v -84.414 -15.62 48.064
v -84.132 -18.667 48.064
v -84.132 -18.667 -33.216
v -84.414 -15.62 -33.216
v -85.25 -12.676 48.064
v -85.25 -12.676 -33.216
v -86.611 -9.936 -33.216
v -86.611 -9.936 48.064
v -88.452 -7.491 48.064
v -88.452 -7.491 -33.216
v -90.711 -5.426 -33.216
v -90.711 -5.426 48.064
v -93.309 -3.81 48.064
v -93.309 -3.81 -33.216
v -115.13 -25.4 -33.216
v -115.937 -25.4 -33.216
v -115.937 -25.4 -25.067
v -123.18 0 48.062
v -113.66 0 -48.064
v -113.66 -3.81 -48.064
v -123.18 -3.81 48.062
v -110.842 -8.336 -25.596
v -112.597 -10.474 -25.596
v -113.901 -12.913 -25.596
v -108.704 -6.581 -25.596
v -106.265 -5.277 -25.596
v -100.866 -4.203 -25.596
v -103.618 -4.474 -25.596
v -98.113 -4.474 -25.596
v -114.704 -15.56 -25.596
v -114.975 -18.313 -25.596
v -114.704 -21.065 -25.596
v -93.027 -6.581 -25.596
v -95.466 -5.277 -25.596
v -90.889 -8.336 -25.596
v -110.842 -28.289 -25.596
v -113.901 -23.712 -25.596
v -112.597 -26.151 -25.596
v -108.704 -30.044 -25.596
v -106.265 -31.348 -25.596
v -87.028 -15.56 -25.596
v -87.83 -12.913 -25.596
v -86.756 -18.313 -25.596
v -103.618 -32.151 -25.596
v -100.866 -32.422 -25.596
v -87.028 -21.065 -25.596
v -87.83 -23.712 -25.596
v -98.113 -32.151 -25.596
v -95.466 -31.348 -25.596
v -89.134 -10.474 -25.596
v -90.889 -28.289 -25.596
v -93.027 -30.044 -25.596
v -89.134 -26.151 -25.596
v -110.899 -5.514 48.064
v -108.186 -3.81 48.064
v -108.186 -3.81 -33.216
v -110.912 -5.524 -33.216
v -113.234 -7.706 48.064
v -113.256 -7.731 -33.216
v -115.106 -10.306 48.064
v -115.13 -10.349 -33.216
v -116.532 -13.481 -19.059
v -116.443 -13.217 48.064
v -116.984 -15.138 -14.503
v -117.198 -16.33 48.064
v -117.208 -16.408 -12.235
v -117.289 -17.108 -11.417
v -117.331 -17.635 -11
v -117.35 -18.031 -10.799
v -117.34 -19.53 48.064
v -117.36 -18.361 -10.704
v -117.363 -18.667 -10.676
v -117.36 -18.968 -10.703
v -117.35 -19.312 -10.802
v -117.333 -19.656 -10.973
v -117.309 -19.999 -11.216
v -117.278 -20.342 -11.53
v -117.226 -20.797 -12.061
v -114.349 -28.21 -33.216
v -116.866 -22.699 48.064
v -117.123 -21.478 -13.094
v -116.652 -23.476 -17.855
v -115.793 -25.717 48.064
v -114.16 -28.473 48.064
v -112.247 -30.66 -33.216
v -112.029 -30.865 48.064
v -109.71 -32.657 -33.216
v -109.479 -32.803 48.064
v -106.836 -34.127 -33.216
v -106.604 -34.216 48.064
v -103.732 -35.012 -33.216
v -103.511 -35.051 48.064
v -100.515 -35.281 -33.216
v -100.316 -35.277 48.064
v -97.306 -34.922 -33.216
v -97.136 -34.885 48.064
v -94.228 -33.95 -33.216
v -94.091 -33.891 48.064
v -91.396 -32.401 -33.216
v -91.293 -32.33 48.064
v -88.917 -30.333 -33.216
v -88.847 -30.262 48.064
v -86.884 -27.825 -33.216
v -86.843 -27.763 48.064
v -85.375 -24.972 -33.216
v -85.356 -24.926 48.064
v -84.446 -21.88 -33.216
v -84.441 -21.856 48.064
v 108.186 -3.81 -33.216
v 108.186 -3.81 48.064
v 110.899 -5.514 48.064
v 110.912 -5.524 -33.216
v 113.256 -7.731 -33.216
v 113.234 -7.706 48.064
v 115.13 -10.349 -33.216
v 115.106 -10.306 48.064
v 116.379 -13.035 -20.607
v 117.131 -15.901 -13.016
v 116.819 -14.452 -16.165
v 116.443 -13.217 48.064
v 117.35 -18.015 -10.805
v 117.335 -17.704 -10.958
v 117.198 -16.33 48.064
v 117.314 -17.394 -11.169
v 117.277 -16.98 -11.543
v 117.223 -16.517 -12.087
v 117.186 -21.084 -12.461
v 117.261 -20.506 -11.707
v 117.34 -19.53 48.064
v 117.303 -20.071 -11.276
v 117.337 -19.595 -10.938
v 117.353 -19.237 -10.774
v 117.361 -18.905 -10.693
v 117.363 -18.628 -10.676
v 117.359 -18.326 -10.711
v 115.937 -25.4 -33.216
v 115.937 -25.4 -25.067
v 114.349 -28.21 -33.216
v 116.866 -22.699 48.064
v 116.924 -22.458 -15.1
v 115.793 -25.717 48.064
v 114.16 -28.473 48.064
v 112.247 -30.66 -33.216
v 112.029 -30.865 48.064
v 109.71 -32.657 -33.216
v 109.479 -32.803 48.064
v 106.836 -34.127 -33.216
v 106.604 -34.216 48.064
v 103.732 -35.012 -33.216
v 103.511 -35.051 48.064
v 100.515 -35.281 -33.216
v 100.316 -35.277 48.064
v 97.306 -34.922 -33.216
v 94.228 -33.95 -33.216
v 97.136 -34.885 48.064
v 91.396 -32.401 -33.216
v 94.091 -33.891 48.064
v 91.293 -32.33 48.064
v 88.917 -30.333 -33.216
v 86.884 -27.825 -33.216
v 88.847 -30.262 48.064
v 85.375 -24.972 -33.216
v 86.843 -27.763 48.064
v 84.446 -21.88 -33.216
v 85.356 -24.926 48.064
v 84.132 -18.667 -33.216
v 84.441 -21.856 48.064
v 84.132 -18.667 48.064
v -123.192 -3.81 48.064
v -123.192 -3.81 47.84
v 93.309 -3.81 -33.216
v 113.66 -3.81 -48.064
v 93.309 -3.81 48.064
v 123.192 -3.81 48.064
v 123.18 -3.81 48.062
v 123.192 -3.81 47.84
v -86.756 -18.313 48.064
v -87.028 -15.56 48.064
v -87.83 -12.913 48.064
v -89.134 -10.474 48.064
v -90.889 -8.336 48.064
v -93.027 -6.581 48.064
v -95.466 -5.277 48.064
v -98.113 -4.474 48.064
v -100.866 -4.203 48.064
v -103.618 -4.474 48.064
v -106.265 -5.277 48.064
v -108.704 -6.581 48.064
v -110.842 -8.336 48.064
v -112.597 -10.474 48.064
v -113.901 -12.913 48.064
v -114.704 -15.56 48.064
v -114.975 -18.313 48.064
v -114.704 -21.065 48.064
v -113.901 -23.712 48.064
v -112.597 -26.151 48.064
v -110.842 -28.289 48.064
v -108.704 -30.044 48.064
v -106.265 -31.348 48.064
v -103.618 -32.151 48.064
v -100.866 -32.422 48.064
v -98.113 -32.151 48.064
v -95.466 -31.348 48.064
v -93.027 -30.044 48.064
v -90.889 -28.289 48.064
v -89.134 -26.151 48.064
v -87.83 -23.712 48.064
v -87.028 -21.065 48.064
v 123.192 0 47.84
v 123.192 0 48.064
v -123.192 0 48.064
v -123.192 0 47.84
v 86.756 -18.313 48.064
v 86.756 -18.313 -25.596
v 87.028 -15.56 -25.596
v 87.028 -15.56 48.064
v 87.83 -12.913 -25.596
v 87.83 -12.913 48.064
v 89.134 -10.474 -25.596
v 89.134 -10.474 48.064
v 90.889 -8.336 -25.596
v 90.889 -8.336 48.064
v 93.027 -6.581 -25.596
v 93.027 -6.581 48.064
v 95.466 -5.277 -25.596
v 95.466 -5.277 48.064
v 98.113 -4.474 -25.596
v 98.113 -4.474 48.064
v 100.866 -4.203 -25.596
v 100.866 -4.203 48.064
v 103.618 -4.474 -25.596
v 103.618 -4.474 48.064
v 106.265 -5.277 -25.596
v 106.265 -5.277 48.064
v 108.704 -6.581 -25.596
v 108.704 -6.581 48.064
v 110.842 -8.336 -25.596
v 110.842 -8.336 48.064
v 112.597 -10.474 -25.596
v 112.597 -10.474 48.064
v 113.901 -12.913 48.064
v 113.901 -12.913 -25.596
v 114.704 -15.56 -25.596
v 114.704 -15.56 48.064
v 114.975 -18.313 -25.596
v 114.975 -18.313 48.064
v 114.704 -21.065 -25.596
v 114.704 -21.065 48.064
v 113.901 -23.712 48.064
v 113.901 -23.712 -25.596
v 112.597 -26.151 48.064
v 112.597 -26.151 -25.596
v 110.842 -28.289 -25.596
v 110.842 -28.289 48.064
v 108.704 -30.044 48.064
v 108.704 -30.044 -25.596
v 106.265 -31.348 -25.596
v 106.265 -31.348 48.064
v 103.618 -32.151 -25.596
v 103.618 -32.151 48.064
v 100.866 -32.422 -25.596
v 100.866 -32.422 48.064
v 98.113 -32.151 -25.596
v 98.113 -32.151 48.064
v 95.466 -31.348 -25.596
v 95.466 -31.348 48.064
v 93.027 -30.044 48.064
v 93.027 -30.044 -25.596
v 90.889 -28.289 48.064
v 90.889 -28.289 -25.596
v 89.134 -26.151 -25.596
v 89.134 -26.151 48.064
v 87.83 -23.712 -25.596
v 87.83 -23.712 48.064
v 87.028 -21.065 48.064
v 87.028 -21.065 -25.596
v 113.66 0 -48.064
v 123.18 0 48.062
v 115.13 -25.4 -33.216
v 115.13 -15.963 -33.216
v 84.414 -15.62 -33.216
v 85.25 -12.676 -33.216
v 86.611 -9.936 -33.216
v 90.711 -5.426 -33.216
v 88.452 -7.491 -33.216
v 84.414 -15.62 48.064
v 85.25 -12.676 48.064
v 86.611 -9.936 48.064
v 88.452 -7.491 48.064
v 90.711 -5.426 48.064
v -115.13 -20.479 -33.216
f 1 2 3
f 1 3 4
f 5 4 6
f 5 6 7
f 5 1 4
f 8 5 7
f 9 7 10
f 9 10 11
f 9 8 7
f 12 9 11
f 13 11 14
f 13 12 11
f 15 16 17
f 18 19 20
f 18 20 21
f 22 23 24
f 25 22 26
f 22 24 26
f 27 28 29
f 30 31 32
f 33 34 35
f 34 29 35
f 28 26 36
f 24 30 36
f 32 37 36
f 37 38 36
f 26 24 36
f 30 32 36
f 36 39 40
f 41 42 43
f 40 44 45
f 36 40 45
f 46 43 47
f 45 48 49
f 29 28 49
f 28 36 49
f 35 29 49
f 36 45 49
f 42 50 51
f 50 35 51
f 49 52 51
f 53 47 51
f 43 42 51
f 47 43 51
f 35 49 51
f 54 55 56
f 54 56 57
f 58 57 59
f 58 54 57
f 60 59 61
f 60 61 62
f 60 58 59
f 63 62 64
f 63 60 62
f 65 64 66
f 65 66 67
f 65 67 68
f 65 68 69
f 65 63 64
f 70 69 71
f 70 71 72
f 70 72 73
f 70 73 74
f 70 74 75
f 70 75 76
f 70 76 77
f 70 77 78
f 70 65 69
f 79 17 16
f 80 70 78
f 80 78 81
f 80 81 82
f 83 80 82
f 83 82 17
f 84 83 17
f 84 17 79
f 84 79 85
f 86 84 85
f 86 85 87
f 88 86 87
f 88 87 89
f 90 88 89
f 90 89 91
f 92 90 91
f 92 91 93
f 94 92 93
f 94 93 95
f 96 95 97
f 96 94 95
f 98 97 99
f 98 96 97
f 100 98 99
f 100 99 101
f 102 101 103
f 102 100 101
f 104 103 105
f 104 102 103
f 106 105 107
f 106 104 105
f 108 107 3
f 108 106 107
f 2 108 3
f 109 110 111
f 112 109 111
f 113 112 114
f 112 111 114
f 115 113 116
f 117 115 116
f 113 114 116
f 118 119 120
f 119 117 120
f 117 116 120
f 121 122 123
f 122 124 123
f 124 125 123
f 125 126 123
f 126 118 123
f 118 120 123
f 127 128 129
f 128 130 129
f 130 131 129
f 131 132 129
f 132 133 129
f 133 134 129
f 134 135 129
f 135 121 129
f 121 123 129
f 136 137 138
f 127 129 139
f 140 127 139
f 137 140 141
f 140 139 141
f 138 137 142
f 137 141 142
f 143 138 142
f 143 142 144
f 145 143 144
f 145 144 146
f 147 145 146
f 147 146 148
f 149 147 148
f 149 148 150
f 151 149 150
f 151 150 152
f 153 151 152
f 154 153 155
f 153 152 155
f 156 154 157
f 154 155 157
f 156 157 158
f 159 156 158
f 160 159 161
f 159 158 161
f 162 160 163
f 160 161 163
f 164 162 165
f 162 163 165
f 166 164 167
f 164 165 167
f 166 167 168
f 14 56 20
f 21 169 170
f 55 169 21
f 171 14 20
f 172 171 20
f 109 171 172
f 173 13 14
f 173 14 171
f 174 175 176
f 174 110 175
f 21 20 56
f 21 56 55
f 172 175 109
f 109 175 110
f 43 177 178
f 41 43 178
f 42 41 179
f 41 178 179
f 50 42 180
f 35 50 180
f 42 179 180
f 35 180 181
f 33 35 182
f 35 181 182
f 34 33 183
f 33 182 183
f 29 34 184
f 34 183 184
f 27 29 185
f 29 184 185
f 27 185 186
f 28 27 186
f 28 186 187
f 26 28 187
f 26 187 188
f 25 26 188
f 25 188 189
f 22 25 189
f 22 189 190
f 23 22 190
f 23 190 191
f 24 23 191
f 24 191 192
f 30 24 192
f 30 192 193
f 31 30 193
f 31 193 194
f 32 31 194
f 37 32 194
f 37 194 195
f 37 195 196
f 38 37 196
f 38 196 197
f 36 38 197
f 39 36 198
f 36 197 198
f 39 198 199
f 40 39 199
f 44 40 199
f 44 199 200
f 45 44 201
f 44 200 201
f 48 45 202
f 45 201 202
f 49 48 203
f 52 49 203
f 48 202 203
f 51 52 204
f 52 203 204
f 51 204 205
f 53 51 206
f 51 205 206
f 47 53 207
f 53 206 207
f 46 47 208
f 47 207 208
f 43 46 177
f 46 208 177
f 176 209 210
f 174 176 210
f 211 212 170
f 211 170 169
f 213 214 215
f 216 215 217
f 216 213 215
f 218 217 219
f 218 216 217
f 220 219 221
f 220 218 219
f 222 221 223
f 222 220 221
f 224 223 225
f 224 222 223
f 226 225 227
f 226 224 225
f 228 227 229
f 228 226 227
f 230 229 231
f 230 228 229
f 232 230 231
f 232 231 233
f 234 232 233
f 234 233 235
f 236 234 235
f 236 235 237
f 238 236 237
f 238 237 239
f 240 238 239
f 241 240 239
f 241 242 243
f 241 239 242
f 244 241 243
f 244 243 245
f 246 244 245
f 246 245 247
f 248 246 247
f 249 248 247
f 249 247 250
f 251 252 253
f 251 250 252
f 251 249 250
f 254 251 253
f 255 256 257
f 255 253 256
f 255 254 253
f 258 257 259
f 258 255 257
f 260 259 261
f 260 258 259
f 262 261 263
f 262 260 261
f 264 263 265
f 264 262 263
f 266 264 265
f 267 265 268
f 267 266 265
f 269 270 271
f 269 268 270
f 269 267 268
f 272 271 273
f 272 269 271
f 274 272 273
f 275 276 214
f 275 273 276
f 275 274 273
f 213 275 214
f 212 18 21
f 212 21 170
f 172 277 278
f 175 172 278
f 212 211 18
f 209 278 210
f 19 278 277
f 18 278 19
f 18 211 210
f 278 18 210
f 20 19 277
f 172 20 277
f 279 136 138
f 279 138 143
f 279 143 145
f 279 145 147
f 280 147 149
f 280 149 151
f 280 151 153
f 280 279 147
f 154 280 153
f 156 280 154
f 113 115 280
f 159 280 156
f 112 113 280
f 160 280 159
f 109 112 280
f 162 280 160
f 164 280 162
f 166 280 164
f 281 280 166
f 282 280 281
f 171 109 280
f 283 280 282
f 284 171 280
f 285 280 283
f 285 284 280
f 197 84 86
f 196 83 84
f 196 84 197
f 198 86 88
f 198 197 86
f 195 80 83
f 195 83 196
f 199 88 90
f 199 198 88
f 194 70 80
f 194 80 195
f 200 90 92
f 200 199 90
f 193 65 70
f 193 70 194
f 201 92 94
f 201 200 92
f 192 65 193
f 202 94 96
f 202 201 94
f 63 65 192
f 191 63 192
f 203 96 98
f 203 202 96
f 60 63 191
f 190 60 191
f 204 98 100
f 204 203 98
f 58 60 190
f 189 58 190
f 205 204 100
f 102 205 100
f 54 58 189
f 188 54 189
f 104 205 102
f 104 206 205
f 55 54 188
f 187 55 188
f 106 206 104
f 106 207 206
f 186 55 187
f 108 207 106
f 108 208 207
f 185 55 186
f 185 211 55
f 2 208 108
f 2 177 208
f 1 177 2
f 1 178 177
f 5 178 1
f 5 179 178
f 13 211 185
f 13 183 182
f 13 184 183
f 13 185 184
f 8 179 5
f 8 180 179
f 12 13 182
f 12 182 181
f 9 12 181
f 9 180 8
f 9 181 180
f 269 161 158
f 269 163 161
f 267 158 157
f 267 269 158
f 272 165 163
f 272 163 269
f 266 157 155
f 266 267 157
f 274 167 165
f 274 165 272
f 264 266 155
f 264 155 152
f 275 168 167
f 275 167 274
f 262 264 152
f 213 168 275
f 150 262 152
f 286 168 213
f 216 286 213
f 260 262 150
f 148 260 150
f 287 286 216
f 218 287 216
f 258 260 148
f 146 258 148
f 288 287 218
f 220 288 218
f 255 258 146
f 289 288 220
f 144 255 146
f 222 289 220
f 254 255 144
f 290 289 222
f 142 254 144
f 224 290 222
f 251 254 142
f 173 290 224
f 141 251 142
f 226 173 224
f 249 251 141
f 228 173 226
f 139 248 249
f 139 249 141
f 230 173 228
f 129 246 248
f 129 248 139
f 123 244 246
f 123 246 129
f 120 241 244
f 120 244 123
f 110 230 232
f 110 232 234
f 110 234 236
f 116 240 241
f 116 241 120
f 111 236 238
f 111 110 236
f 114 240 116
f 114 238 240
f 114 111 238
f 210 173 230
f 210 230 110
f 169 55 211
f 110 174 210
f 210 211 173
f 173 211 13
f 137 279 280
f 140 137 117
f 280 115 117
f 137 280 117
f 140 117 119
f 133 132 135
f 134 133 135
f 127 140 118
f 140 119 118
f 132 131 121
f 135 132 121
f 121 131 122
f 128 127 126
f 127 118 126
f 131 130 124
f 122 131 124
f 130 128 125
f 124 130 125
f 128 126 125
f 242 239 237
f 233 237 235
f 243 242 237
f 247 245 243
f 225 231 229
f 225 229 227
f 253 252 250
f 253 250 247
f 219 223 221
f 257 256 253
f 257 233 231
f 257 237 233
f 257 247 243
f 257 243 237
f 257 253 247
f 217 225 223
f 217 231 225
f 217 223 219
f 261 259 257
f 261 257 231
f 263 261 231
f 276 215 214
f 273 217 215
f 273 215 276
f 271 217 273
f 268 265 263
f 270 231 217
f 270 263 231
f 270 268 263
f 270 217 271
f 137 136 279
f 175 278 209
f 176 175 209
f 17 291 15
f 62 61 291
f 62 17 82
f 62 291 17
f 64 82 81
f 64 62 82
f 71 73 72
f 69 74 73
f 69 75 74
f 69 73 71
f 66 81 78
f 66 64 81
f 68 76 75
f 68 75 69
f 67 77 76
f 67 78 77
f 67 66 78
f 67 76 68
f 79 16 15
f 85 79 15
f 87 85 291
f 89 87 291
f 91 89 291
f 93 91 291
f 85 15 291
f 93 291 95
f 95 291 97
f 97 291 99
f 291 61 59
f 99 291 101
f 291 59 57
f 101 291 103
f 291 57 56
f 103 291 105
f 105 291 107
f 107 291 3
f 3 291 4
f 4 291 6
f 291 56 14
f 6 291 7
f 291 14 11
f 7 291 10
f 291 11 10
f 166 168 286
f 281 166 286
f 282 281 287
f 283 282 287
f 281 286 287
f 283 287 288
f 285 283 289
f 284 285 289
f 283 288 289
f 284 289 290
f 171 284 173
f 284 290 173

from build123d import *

# Parameters (mm, degrees)
F0_W     = 246.3848441839
F0_H     = 96.1289182305
F1_DEPTH = 3.81
F2_R     = 14.1092662394
F3_DEPTH = 81.28
F5_DEPTH = 25.4
F6_R     = 14.1092662394
F7_DEPTH = 7.62


# Not quite as in the source:
# - a pattern or mirror of a feature is missing from the dataset's text; its kind, count and spacing are read off the source's solid
# - a feature names something its author has since deleted; it is built from what else it names


with BuildPart() as f1:
    # F0 (on Front) → F1 (new body)
    with BuildSketch(Plane.XZ):
        Rectangle(F0_W, F0_H)
    extrude(amount=F1_DEPTH)

    # F2 (on face) → F3 (join)
    with BuildSketch(Plane.XY.offset(48.0644591153)):
        with BuildLine():
            ThreePointArc((-108.1859269769, -3.81), (-109.4788428986, -32.8031453268), (-84.1323126967, -18.6671093106))
            ThreePointArc((-84.1323126967, -18.6671093106), (-86.6114524229, -9.9357548511), (-93.3090499012, -3.81))
            Line((-93.3090499012, -3.81), (-108.1859269769, -3.81))
        make_face()
        with Locations((-100.8657291532, -18.3125622571)):
            Circle(F2_R, mode=Mode.SUBTRACT)
    f3 = extrude(amount=-F3_DEPTH)

    # F3_copies: F3 across plane
    add(f3.mirror(Plane(origin=(0, 0, 0), x_dir=(0, 0, 1), z_dir=(1, 0, 0))))

    # F4 (on face) → F5 (cut)
    with BuildSketch(Plane(origin=(0, 0, 0), x_dir=(-1, 0, 0), z_dir=(0, 1, 0))):
        Polygon((-113.6597358778, -48.0644591153), (-123.1800099188, 48.0619171371), (-123.192422092, 47.8396813394), (-123.192422092, -48.0644591153), align=None)
    f5 = extrude(amount=-F5_DEPTH, mode=Mode.SUBTRACT)

    # F5_copies: F5 across plane
    add(f5.mirror(Plane(origin=(0, 0, 0), x_dir=(0, 0, -1), z_dir=(-1, 0, 0))), mode=Mode.SUBTRACT)

    # F6 (on face) → F7 (join)
    with BuildSketch(Plane(origin=(0, 0, -33.2155408847), x_dir=(1, 0, 0), z_dir=(0, 0, -1))):
        with BuildLine():
            ThreePointArc((-115.130360032, 15.9625050025), (-99.772384803, 3.8619408749), (-86.5015784629, 18.2207971811))
            ThreePointArc((-86.5015784629, 18.2207971811), (-99.772384803, 32.5796534874), (-115.130360032, 20.4790893598))
            Line((-115.130360032, 20.4790893598), (-115.130360032, 15.9625050025))
        make_face()
        with Locations((-100.8657291532, 18.3125622571)):
            Circle(F6_R, mode=Mode.SUBTRACT)
        with Locations((-100.8657291532, 18.3125622571)):
            Circle(F6_R)
    f7 = extrude(amount=-F7_DEPTH)

    # F7_copies: F7 across plane
    add(f7.mirror(Plane(origin=(0, 0, 0), x_dir=(0, 0, 1), z_dir=(1, 0, 0))))


solid = f1.part
